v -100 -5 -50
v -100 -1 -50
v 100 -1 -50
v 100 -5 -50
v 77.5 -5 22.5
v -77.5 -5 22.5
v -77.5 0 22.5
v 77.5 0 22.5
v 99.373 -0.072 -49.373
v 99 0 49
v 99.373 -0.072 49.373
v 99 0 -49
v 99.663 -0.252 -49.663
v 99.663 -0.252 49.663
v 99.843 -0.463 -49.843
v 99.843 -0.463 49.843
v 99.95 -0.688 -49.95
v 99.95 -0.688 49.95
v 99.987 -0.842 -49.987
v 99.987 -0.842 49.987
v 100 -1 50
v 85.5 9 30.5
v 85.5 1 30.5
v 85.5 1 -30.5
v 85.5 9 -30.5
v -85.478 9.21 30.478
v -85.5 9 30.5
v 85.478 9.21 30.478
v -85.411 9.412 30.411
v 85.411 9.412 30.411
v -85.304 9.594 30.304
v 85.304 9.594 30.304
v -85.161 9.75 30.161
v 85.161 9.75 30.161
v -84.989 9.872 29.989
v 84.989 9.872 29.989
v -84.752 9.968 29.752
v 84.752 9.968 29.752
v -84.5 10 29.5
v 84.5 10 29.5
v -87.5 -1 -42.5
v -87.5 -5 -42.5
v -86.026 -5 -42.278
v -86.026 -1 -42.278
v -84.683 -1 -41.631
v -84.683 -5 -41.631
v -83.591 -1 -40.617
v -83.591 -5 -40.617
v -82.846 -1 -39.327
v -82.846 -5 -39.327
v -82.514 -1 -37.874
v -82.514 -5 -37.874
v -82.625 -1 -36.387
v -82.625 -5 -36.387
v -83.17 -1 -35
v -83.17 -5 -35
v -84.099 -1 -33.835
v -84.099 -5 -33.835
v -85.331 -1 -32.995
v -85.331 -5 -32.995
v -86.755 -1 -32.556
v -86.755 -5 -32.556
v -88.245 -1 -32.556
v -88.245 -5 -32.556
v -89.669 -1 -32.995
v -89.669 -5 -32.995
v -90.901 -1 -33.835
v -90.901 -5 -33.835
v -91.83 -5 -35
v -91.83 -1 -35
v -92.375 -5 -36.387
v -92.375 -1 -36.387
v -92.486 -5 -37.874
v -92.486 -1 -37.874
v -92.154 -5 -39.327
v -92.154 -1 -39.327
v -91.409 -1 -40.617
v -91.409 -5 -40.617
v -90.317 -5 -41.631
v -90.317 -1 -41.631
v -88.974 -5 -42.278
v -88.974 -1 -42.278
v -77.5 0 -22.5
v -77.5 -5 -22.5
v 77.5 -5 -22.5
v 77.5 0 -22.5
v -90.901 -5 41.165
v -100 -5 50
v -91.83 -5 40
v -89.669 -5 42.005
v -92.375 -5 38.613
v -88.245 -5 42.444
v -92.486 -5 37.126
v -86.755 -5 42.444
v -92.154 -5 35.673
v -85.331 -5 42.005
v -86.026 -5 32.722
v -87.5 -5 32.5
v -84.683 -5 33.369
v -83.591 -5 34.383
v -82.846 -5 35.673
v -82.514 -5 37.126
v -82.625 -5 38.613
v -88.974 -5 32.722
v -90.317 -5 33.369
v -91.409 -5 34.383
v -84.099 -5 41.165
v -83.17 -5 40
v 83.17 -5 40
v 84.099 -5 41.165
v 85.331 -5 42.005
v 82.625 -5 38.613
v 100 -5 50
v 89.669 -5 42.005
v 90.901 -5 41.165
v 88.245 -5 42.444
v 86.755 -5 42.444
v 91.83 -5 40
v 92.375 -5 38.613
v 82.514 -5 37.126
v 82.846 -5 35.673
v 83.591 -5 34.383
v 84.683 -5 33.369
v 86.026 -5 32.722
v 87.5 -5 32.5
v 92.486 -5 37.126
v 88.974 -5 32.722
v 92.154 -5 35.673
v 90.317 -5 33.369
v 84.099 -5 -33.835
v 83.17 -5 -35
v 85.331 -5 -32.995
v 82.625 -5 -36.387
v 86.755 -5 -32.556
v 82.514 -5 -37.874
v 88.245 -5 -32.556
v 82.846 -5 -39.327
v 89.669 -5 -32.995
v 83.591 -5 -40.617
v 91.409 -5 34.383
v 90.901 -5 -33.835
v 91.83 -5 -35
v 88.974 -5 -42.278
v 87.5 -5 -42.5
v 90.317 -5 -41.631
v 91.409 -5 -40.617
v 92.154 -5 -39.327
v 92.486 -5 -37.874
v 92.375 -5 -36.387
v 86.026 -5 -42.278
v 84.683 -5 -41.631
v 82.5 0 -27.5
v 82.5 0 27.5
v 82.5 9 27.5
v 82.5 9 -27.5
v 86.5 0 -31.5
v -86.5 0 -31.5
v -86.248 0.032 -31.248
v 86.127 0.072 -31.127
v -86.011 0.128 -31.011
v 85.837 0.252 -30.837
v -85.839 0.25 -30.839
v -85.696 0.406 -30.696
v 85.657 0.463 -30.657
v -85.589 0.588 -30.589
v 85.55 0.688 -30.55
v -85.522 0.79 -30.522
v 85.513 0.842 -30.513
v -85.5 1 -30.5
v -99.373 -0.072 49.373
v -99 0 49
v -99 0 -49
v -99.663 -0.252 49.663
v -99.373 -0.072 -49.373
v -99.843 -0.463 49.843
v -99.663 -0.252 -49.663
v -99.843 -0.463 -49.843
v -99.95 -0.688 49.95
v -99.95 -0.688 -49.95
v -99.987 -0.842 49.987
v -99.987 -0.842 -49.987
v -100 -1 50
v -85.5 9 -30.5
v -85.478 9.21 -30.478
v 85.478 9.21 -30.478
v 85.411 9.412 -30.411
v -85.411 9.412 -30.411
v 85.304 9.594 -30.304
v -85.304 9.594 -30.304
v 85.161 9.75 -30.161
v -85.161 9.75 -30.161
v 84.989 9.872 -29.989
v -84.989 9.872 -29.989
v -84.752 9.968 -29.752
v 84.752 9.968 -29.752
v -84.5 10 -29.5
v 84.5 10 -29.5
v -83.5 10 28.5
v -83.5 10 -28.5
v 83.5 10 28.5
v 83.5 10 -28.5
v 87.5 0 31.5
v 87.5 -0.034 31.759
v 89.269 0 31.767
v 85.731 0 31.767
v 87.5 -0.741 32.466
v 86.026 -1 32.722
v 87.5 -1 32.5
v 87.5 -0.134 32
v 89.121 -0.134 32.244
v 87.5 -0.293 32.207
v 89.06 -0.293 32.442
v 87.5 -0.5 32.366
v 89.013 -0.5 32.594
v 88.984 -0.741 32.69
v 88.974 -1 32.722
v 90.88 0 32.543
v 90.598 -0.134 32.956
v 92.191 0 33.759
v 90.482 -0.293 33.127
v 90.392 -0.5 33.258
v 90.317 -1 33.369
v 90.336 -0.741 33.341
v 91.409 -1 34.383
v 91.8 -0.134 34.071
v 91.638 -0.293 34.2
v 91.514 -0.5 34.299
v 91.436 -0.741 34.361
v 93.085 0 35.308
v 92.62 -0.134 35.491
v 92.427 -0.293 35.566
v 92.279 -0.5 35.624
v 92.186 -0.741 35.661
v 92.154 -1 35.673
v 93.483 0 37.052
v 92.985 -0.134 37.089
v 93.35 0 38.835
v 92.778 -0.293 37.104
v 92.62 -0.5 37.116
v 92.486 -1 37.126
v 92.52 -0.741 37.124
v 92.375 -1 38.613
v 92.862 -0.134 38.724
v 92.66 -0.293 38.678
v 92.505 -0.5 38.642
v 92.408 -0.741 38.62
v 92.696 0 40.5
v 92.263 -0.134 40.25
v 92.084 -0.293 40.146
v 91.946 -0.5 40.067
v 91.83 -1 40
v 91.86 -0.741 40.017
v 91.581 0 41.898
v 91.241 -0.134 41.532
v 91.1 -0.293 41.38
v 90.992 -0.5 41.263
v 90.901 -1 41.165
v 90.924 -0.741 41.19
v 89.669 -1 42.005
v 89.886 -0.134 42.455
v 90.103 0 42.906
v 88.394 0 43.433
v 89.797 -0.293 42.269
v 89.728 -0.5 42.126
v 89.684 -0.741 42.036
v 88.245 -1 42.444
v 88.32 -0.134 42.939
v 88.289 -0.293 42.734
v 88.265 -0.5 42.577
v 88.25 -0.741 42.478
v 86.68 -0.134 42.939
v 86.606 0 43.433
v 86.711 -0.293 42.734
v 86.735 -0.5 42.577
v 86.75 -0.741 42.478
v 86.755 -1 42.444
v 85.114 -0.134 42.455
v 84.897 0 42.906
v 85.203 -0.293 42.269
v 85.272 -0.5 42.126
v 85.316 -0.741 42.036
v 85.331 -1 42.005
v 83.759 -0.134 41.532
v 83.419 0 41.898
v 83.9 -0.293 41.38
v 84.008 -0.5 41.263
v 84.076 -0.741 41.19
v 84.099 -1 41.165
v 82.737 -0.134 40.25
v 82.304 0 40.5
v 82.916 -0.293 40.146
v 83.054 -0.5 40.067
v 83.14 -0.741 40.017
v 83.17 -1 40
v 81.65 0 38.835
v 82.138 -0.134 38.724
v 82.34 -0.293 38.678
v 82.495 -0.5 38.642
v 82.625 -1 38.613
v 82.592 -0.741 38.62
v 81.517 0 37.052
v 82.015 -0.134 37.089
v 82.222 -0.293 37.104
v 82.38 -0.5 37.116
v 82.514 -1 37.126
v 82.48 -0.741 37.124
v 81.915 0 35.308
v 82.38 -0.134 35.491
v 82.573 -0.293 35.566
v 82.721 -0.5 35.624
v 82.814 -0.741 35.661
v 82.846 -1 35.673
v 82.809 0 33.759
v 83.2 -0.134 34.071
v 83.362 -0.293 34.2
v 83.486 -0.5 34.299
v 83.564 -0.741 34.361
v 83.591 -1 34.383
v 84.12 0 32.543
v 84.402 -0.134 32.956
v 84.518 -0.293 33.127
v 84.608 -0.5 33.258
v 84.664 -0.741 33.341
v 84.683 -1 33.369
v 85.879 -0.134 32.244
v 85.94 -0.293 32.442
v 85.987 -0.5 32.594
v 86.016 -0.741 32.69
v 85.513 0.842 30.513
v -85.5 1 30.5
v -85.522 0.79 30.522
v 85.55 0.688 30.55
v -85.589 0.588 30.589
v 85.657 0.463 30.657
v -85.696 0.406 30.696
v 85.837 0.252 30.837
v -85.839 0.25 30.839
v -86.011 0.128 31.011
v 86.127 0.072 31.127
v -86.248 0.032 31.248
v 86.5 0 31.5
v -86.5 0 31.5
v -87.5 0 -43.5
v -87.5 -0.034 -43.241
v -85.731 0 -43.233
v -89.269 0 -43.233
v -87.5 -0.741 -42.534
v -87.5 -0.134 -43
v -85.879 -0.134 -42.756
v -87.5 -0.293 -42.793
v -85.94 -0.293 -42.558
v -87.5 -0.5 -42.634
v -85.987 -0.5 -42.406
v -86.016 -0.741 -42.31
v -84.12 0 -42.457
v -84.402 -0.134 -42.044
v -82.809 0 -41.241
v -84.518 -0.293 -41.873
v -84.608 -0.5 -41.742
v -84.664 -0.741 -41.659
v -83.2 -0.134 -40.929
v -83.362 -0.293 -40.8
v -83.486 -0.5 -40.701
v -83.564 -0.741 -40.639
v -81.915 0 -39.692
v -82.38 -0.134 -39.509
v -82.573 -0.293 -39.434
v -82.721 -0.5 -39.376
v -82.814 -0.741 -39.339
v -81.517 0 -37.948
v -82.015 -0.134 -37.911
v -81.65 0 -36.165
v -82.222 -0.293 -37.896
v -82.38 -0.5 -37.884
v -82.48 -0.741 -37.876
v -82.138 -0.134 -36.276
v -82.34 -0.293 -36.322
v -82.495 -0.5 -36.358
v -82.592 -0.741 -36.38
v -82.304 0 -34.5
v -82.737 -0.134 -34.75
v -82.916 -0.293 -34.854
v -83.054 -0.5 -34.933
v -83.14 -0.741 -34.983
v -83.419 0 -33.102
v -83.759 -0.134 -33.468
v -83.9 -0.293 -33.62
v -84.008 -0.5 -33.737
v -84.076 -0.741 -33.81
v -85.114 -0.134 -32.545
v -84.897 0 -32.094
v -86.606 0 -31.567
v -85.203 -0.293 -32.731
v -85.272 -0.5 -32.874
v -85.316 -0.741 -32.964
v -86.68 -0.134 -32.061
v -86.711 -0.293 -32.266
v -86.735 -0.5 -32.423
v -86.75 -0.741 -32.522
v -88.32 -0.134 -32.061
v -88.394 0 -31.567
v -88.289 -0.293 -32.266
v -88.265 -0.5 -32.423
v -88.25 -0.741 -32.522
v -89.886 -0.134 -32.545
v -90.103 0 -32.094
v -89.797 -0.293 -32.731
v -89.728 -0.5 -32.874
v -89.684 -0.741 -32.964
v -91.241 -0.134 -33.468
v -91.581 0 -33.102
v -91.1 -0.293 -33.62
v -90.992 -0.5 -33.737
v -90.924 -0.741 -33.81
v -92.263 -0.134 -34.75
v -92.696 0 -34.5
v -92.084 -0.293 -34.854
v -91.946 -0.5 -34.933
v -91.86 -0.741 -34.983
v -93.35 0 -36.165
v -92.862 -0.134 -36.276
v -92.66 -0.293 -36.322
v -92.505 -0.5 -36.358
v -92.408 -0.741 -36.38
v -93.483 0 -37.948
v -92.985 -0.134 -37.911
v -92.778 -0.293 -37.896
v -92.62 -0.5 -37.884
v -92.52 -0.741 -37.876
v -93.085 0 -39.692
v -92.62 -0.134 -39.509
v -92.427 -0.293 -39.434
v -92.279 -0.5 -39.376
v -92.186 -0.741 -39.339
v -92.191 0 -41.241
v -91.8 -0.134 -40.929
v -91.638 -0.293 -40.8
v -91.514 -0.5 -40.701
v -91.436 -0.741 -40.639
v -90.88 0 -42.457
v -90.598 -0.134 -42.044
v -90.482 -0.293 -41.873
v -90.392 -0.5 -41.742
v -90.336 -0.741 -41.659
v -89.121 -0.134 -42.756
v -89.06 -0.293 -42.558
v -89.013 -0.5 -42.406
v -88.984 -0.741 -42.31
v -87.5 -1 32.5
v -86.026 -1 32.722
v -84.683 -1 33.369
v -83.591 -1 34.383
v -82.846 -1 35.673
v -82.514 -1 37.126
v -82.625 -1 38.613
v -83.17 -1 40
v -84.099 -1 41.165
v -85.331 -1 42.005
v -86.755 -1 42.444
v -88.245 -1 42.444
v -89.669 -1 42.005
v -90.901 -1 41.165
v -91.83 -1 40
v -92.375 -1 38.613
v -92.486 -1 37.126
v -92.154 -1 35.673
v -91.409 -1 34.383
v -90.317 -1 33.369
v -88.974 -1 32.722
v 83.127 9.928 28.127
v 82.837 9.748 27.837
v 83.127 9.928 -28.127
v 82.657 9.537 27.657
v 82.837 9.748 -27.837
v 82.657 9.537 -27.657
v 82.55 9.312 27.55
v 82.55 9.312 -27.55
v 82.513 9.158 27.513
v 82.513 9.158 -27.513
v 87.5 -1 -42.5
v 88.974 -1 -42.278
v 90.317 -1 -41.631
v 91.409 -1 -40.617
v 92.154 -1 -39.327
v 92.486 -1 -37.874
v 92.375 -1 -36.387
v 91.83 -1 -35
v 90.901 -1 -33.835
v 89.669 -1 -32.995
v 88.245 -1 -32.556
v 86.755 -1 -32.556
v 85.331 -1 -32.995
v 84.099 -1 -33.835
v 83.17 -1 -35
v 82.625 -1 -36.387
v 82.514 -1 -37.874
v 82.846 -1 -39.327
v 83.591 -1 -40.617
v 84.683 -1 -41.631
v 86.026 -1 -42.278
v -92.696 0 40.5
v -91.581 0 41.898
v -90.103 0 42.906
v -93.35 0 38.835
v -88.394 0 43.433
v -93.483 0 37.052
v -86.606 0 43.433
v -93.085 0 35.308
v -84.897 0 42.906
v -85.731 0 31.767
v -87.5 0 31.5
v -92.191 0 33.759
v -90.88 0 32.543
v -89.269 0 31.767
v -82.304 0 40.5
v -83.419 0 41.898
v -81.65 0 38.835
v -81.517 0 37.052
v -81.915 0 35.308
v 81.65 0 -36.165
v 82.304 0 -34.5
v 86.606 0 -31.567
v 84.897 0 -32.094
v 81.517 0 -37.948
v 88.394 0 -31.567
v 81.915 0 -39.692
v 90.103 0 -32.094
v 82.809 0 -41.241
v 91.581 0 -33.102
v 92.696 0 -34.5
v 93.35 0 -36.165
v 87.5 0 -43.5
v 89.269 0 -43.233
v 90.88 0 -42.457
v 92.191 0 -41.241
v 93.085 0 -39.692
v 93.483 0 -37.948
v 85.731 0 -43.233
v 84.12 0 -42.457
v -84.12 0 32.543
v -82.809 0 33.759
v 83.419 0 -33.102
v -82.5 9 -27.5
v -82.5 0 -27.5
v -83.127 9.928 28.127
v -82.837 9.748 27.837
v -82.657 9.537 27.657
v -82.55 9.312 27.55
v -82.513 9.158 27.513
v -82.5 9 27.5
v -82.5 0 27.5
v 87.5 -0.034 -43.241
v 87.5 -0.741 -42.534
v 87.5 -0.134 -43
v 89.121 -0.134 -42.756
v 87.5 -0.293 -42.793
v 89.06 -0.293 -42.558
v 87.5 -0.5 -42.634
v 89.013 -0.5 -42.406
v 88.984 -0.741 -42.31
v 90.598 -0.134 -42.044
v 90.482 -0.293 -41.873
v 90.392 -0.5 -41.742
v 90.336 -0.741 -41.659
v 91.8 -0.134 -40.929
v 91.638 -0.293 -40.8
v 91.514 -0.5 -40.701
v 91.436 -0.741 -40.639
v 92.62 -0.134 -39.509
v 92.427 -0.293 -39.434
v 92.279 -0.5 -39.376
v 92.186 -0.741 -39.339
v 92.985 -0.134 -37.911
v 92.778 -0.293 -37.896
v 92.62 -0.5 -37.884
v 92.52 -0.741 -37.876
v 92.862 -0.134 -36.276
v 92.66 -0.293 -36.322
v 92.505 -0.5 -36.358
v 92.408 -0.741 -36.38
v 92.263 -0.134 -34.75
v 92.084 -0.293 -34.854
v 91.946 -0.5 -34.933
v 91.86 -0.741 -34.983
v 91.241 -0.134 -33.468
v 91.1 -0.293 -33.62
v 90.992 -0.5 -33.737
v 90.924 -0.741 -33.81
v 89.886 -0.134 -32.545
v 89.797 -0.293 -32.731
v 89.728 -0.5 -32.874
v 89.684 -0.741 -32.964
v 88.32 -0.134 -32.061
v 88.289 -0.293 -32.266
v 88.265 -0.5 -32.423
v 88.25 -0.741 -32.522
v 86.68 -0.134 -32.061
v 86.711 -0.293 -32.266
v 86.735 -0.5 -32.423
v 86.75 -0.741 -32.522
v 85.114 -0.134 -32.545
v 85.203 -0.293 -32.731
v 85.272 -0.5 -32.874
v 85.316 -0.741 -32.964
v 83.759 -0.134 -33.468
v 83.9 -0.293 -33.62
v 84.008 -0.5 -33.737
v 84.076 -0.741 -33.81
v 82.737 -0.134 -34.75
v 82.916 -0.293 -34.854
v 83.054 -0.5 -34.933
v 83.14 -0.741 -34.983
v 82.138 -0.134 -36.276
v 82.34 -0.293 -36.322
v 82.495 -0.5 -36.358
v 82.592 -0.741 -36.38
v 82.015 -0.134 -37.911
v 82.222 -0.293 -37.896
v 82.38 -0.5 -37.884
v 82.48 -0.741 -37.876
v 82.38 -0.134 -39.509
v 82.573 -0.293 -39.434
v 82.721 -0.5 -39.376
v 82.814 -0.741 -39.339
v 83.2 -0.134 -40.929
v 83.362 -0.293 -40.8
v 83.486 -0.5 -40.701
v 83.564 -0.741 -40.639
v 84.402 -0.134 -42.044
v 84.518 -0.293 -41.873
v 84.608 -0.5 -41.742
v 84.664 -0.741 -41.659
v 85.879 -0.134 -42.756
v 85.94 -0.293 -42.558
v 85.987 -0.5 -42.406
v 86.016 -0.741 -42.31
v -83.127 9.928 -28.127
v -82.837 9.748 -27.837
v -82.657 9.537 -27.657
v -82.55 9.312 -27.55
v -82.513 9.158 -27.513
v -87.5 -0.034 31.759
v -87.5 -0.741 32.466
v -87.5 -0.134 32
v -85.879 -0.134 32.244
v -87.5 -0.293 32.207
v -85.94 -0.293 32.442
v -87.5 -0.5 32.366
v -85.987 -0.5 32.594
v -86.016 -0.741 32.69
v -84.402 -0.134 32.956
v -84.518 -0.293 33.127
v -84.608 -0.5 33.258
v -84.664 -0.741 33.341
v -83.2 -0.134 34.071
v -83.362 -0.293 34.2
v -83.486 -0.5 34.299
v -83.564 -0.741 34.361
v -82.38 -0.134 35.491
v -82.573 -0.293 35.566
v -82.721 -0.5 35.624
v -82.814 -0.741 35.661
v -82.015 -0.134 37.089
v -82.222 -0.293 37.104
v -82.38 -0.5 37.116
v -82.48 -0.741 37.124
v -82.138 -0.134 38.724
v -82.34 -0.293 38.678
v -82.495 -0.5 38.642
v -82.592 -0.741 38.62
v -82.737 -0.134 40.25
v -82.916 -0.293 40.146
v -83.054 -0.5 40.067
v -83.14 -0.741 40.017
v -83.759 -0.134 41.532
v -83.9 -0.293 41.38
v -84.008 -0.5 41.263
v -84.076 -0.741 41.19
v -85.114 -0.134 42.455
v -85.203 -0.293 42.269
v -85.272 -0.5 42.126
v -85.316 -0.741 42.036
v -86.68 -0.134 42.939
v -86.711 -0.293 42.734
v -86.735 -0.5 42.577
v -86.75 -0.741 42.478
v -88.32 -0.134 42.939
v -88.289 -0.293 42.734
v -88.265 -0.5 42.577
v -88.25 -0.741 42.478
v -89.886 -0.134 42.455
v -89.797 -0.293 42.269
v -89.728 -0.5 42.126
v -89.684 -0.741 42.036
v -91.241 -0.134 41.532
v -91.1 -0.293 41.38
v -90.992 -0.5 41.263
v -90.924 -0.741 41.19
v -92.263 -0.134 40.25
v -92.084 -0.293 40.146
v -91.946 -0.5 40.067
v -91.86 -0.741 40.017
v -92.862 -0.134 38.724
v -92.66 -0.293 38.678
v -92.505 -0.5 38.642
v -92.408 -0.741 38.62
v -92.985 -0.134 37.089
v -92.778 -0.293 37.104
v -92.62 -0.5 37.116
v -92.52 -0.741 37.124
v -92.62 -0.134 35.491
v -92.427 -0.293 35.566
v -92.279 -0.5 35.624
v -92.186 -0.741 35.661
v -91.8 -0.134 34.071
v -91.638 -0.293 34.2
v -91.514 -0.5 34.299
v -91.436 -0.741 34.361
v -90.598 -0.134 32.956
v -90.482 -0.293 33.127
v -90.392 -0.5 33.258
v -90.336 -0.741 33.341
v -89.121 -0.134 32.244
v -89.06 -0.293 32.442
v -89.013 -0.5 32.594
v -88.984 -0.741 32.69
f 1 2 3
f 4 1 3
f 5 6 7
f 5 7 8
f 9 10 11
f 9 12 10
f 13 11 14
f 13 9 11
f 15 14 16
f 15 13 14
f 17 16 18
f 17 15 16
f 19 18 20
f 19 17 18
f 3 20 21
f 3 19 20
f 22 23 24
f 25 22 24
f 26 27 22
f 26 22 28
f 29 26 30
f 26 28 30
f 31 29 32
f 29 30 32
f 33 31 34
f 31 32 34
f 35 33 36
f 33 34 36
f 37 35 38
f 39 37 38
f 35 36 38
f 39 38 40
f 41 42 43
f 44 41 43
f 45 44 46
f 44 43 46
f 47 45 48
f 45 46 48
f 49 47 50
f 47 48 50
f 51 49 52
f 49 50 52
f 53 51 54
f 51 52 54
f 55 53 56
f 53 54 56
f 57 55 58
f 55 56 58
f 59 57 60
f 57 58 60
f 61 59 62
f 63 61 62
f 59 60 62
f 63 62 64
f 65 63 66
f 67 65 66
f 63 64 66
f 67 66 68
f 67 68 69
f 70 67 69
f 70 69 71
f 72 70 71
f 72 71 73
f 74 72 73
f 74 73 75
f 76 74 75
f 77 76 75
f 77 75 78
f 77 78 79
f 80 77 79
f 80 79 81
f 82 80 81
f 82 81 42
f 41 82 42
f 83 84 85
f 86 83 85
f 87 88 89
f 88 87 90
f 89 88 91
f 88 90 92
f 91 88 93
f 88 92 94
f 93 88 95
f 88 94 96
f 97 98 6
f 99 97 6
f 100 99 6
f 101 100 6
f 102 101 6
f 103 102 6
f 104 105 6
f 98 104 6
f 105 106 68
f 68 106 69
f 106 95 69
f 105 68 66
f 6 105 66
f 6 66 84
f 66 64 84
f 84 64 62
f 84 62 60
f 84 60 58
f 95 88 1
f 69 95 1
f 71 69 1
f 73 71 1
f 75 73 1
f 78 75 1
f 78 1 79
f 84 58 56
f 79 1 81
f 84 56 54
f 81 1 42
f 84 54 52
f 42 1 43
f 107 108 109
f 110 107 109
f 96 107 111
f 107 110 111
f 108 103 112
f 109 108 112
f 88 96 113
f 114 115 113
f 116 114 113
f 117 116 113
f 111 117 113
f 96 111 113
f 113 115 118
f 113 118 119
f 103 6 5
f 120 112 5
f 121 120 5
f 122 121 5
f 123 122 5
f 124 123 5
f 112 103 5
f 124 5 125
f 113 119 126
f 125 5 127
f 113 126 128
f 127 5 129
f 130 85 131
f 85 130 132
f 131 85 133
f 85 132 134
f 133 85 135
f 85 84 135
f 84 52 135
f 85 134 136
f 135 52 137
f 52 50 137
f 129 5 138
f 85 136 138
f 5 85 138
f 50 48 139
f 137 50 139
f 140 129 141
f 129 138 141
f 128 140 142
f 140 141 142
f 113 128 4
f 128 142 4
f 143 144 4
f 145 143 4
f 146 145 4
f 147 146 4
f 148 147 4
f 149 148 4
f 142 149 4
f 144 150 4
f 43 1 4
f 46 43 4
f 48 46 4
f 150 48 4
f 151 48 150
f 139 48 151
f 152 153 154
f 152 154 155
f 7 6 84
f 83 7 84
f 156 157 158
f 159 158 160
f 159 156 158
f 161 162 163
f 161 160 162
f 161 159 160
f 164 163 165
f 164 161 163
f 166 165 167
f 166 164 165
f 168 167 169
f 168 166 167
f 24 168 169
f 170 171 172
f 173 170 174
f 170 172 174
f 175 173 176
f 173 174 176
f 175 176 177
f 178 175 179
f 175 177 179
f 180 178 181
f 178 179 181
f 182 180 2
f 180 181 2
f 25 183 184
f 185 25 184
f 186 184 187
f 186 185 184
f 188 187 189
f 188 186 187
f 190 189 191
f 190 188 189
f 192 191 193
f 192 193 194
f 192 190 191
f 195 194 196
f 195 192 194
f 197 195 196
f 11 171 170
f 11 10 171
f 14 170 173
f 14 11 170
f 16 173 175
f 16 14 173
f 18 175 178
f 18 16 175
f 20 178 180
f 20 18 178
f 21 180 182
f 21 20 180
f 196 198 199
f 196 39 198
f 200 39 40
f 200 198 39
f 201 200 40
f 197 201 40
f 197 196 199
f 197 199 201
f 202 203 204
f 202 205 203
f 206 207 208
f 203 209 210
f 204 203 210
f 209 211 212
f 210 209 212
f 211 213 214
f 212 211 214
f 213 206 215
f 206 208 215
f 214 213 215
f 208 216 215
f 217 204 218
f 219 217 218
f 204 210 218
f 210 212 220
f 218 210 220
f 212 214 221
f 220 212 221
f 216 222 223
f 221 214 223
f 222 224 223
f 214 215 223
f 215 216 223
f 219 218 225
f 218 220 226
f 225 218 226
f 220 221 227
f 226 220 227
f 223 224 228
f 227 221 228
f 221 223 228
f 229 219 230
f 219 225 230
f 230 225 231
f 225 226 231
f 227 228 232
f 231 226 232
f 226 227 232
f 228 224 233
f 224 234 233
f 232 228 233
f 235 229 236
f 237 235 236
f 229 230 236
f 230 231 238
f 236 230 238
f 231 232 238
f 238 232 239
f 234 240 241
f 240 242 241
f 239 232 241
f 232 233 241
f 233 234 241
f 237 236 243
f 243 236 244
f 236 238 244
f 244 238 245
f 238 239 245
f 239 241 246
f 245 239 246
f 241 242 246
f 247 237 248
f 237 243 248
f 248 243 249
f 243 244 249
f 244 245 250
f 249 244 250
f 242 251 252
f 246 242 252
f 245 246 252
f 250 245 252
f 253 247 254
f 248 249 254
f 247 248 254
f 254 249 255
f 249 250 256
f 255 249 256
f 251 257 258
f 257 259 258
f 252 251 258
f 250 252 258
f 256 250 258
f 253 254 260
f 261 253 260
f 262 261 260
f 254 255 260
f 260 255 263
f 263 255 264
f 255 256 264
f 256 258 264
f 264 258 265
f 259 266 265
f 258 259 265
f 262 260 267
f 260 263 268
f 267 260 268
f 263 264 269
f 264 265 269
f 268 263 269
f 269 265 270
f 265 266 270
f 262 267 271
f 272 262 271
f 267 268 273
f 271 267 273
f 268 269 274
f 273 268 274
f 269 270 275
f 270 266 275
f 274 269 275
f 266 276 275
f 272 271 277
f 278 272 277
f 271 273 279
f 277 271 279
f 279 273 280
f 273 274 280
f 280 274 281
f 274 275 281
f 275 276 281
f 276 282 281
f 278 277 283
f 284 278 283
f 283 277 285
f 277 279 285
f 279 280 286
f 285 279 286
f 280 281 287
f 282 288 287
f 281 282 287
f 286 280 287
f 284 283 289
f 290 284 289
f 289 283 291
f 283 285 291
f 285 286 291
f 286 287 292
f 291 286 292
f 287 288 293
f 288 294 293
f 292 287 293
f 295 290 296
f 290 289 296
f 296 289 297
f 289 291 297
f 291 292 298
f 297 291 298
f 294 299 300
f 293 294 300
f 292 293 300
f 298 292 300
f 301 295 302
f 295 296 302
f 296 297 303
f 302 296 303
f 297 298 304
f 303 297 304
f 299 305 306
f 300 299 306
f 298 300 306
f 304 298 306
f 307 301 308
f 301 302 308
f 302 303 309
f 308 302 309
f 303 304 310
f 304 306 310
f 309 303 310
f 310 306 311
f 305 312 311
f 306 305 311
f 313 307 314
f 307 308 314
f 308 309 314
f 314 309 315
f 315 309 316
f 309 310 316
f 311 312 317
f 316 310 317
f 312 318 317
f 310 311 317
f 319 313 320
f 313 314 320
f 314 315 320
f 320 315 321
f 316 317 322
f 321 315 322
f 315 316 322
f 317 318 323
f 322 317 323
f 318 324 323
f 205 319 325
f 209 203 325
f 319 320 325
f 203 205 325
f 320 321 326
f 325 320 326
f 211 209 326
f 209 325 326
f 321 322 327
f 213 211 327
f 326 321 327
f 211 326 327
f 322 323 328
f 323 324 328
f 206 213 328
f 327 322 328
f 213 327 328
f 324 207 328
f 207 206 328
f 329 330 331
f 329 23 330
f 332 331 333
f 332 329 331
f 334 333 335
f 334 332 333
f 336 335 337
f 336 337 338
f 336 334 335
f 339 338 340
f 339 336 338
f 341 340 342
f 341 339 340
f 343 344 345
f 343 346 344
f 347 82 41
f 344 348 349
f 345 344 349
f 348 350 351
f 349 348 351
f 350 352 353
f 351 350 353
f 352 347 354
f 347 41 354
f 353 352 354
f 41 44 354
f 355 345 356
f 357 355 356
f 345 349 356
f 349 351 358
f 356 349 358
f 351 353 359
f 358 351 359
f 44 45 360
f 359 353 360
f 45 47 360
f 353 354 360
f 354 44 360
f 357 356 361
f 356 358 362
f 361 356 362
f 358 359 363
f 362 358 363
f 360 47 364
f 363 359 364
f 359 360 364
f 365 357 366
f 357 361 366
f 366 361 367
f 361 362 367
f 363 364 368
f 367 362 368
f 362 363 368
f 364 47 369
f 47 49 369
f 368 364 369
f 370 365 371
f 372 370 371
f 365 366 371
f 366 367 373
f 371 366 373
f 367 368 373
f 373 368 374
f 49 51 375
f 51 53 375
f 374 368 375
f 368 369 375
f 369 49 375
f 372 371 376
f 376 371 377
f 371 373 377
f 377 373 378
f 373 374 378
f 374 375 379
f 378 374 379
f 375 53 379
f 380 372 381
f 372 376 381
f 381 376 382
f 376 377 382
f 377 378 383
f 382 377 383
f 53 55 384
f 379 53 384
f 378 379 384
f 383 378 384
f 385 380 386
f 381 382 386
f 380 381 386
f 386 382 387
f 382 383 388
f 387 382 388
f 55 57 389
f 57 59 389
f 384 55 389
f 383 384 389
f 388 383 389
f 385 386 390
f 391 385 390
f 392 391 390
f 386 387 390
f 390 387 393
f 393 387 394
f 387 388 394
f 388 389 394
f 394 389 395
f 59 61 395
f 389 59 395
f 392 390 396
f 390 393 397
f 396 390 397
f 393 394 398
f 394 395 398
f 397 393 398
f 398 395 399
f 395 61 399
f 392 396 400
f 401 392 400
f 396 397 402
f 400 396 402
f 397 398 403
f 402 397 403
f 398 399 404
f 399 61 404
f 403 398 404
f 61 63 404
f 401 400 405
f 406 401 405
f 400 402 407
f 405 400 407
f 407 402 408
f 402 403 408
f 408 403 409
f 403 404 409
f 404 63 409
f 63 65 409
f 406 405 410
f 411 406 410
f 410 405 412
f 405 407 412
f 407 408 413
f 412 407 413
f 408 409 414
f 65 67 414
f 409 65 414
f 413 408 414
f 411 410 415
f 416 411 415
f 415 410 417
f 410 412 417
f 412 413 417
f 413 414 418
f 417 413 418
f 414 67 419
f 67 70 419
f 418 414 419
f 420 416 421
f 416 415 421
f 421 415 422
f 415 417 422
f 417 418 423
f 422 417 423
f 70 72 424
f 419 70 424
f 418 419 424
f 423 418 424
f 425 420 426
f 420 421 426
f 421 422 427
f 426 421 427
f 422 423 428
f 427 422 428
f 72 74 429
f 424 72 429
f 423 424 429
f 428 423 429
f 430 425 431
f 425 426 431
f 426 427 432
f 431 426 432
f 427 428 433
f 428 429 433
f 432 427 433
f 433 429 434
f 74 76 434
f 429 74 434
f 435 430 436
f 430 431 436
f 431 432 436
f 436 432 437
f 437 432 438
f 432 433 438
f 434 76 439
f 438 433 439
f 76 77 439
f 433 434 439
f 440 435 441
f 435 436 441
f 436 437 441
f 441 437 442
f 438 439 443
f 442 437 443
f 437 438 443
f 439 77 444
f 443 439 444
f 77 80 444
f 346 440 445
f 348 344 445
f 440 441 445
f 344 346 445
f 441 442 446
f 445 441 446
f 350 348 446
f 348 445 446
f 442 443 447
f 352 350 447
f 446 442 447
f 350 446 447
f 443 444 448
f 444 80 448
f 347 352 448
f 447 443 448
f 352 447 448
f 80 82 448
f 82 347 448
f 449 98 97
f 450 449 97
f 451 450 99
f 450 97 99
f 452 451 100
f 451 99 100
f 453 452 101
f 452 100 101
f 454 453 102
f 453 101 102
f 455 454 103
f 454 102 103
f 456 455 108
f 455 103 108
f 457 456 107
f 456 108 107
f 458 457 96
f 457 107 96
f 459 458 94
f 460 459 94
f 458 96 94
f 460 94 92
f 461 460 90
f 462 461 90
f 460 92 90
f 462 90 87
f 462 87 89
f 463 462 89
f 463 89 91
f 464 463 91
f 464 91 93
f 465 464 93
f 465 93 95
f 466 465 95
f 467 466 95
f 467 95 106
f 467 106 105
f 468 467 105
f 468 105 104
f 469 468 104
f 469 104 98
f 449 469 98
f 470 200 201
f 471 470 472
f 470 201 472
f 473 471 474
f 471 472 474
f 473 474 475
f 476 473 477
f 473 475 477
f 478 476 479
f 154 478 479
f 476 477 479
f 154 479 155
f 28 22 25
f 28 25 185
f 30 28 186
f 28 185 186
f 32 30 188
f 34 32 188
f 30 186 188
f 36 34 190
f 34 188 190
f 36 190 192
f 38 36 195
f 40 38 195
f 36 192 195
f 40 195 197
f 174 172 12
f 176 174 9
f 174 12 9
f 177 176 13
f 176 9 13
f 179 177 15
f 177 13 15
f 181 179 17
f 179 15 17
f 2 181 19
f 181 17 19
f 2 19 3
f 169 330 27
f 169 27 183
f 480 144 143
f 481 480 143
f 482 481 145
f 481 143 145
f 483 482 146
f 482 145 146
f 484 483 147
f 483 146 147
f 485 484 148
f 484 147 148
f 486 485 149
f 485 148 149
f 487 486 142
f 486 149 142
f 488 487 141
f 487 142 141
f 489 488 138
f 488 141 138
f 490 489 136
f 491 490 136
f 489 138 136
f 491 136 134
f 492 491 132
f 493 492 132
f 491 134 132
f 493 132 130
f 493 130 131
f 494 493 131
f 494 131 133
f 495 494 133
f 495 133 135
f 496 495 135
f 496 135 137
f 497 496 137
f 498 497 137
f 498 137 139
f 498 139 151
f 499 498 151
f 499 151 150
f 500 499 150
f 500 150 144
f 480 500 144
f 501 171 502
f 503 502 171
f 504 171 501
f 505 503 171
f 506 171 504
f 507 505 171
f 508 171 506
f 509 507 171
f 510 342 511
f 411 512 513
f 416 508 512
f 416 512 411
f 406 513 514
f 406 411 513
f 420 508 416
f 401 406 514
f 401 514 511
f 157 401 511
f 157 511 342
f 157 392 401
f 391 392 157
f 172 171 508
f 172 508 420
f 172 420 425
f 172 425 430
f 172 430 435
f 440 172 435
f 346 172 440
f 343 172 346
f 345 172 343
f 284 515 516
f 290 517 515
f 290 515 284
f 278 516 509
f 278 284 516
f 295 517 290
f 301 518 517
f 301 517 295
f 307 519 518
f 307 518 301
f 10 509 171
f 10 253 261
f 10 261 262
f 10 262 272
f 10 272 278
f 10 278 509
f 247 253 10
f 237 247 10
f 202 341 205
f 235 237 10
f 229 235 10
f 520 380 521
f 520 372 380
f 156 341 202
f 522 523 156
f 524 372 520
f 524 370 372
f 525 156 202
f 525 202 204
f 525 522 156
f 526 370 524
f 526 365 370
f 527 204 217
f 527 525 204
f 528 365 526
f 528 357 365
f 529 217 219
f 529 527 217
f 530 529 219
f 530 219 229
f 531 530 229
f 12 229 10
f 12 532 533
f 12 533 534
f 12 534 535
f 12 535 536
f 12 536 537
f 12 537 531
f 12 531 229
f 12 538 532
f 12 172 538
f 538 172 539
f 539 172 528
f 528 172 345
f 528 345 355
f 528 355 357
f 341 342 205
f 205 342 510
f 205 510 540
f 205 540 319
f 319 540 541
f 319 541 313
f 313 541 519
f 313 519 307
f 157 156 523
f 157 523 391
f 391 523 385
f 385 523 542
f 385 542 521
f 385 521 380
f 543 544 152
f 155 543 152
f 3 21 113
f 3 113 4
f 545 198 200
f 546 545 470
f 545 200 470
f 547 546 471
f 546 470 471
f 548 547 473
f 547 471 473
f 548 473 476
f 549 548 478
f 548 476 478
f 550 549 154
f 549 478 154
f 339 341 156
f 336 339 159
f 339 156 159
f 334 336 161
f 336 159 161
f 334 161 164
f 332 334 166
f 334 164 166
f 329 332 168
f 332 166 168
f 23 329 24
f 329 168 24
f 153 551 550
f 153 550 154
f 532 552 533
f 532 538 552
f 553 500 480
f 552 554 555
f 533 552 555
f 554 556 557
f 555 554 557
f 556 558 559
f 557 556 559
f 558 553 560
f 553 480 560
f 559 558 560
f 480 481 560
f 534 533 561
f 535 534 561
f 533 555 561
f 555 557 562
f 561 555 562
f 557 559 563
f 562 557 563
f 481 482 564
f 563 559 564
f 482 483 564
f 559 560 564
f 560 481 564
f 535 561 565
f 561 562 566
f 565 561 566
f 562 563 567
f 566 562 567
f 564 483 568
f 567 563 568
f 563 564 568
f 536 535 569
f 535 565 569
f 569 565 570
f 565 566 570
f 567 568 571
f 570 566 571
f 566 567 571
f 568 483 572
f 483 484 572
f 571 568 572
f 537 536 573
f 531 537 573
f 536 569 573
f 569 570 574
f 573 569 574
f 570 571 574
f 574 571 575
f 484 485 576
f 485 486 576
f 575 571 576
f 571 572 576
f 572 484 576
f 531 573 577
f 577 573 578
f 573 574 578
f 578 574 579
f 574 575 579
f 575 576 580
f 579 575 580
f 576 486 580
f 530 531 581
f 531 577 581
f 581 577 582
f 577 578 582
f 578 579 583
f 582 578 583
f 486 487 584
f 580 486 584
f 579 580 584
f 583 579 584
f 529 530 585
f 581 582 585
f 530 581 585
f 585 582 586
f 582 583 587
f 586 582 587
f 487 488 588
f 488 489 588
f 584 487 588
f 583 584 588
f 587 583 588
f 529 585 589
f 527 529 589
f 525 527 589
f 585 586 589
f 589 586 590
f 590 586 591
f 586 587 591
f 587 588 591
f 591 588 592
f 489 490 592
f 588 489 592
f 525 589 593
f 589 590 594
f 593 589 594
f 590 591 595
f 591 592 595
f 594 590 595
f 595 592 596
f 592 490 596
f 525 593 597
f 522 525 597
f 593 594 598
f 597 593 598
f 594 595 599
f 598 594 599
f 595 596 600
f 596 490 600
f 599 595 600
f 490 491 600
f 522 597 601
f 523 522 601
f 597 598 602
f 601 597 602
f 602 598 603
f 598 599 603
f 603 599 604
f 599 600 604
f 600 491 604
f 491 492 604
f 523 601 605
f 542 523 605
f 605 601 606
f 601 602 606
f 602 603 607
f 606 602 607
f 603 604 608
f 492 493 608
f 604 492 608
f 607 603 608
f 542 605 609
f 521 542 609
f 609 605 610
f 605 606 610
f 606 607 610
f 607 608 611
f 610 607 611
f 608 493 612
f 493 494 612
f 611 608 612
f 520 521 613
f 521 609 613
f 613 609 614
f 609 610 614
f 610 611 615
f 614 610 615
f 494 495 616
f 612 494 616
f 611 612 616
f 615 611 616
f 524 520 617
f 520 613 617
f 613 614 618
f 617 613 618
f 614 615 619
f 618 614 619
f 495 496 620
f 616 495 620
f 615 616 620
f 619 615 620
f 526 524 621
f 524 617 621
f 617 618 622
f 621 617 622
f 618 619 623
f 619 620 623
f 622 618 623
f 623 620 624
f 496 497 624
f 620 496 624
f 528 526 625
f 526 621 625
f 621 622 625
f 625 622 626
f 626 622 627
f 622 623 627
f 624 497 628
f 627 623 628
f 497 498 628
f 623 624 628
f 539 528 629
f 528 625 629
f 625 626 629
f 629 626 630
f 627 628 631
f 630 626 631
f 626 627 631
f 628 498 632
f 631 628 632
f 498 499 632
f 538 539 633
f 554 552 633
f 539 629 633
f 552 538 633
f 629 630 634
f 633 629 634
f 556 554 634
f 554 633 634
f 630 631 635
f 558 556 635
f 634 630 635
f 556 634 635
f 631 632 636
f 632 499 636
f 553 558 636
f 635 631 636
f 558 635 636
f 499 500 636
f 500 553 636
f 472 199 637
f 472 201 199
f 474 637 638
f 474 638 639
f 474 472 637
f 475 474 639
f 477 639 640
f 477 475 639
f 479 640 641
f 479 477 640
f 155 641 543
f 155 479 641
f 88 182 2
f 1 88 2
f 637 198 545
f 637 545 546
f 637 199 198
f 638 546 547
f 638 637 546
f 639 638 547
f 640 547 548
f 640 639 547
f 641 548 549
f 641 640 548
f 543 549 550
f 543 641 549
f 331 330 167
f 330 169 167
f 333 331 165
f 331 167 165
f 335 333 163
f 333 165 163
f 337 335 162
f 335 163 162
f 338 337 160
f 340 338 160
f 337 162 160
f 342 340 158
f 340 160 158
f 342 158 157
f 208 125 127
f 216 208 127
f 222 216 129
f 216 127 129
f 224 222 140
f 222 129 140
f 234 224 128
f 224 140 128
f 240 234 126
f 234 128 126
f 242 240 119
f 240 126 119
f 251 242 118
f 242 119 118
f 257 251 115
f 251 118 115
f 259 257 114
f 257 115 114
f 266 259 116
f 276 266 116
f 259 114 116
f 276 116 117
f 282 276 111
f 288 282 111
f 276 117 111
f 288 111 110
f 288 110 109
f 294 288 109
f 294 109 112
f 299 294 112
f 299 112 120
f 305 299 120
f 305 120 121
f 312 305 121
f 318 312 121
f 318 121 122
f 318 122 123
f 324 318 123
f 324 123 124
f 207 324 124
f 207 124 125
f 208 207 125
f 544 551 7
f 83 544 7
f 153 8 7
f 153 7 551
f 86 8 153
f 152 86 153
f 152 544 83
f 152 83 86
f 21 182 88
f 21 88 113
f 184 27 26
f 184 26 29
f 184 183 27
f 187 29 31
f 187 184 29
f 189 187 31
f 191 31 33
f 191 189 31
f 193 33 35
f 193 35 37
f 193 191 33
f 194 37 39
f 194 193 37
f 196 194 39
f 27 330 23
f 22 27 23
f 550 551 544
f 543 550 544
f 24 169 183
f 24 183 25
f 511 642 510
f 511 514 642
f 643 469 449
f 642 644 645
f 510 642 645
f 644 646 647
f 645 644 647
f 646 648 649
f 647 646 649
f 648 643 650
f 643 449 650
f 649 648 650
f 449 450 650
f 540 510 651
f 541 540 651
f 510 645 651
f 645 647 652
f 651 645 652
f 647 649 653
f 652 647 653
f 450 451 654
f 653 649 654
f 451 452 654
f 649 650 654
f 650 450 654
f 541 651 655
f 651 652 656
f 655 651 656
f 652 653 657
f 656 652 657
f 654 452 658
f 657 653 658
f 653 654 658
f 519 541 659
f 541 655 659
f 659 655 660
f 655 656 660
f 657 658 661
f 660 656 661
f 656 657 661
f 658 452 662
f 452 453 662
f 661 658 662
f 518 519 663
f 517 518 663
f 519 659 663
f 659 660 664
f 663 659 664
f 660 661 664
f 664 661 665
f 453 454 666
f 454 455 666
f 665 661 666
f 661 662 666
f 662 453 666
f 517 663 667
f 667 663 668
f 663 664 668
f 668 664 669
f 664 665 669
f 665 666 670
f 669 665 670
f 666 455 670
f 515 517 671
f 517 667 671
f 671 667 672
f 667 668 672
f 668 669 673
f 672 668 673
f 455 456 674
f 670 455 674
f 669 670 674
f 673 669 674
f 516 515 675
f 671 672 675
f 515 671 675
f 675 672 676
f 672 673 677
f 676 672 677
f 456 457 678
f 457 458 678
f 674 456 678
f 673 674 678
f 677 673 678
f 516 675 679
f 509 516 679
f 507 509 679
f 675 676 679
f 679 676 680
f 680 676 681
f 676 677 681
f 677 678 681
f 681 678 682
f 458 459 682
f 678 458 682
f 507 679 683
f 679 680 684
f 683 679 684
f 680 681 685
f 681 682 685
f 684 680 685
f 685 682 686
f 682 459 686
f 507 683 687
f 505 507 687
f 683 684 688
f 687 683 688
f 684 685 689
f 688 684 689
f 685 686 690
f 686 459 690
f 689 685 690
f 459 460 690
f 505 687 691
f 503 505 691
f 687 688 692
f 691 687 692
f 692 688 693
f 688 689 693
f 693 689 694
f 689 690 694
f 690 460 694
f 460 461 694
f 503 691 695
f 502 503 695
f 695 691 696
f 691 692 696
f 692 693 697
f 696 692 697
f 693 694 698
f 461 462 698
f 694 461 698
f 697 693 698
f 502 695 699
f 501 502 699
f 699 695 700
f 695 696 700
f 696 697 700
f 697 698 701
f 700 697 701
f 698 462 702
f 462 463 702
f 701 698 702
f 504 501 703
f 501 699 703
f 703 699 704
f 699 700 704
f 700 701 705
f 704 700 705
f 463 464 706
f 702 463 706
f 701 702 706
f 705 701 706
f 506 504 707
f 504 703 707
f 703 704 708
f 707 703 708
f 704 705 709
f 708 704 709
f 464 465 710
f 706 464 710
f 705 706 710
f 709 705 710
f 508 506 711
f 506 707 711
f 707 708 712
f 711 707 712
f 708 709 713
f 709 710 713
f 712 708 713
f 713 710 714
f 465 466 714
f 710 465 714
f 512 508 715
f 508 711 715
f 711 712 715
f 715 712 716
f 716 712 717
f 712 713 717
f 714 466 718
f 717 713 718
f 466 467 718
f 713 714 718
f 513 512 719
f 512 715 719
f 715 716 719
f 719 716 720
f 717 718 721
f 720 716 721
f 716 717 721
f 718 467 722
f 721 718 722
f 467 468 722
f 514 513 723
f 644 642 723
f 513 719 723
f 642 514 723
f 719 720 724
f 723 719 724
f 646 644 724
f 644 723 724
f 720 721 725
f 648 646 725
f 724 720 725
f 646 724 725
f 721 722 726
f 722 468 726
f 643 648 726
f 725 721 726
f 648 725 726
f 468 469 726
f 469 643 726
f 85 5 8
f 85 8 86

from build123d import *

# Parameters (mm, degrees)
SKETCH1_W               = 171
SKETCH1_H               = 61
SKETCH1_W_2             = 165
SKETCH1_H_2             = 55
BOSS_EXTRUDE1_DEPTH     = 10
SKETCH2_W               = 200
SKETCH2_H               = 100
BOSS_EXTRUDE2_DEPTH     = 5
FILLET1_R               = 1
F_10_0MM_DOWEL_HOLE1_D  = 10
FILLET2_R               = 1
CUT_EXTRUDE2_DEPTH      = 113.249721603
CUT_EXTRUDE2_DEPTH_BACK = 113.249721603
SKETCH5_W               = 155
SKETCH5_H               = 45


with BuildPart() as part:
    # Sketch1 → Boss-Extrude1 (new body)
    with BuildSketch(Plane(origin=(0, 0, 0), x_dir=(1, 0, 0), z_dir=(0, 1, 0))):
        Rectangle(SKETCH1_W, SKETCH1_H)
        Rectangle(SKETCH1_W_2, SKETCH1_H_2, mode=Mode.SUBTRACT)
    extrude(amount=BOSS_EXTRUDE1_DEPTH)

    # Sketch2 → Boss-Extrude2 (add)
    with BuildSketch(Plane(origin=(0, 0, 0), x_dir=(1, 0, 0), z_dir=(0, 1, 0))):
        Rectangle(SKETCH2_W, SKETCH2_H)
    extrude(amount=-BOSS_EXTRUDE2_DEPTH)

    # Fillet1
    fillet1_edges = [part.edges().sort_by_distance(p)[0] for p in [
        (0, 10, 30.5),
        (82.5, 10, 0),
        (85.5, 10, 0),
        (0, 10, -27.5),
        (-82.5, 10, 0),
        (0, 10, 27.5),
        (0, 10, -30.5),
        (-85.5, 10, 0),
    ]]
    fillet(fillet1_edges, radius=FILLET1_R)

    # Ø10.0mm Dowel Hole1 (through all)
    with Locations(Plane(origin=(-87.5, 0, -37.5), x_dir=(0, 0, 1), z_dir=(0, 1, 0))):
        with Locations((0, 0), (0, 175), (75, 175), (75, 0)):
            Hole(F_10_0MM_DOWEL_HOLE1_D / 2)

    # Fillet2
    fillet2_edges = [part.edges().sort_by_distance(p)[0] for p in [
        (100, 0, 0),
        (0, 0, -50),
        (-100, 0, 0),
        (0, 0, 50),
        (85.5, 0, 0),
        (0, 0, 30.5),
        (-85.5, 0, 0),
        (0, 0, -30.5),
        (-87.5, 0, 42.5),
        (87.5, 0, 42.5),
        (87.5, 0, -32.5),
        (-87.5, 0, -32.5),
    ]]
    fillet(fillet2_edges, radius=FILLET2_R)

    # Sketch5 → Cut-Extrude2 (cut, two sides: drawn at the far end of the back side and taken through both)
    with BuildSketch(Plane(origin=(0, 0, 0), x_dir=(1, 0, 0), z_dir=(0, 1, 0)).offset(-CUT_EXTRUDE2_DEPTH_BACK)):
        Rectangle(SKETCH5_W, SKETCH5_H)
    extrude(amount=CUT_EXTRUDE2_DEPTH + CUT_EXTRUDE2_DEPTH_BACK, mode=Mode.SUBTRACT)


solid = part.part
